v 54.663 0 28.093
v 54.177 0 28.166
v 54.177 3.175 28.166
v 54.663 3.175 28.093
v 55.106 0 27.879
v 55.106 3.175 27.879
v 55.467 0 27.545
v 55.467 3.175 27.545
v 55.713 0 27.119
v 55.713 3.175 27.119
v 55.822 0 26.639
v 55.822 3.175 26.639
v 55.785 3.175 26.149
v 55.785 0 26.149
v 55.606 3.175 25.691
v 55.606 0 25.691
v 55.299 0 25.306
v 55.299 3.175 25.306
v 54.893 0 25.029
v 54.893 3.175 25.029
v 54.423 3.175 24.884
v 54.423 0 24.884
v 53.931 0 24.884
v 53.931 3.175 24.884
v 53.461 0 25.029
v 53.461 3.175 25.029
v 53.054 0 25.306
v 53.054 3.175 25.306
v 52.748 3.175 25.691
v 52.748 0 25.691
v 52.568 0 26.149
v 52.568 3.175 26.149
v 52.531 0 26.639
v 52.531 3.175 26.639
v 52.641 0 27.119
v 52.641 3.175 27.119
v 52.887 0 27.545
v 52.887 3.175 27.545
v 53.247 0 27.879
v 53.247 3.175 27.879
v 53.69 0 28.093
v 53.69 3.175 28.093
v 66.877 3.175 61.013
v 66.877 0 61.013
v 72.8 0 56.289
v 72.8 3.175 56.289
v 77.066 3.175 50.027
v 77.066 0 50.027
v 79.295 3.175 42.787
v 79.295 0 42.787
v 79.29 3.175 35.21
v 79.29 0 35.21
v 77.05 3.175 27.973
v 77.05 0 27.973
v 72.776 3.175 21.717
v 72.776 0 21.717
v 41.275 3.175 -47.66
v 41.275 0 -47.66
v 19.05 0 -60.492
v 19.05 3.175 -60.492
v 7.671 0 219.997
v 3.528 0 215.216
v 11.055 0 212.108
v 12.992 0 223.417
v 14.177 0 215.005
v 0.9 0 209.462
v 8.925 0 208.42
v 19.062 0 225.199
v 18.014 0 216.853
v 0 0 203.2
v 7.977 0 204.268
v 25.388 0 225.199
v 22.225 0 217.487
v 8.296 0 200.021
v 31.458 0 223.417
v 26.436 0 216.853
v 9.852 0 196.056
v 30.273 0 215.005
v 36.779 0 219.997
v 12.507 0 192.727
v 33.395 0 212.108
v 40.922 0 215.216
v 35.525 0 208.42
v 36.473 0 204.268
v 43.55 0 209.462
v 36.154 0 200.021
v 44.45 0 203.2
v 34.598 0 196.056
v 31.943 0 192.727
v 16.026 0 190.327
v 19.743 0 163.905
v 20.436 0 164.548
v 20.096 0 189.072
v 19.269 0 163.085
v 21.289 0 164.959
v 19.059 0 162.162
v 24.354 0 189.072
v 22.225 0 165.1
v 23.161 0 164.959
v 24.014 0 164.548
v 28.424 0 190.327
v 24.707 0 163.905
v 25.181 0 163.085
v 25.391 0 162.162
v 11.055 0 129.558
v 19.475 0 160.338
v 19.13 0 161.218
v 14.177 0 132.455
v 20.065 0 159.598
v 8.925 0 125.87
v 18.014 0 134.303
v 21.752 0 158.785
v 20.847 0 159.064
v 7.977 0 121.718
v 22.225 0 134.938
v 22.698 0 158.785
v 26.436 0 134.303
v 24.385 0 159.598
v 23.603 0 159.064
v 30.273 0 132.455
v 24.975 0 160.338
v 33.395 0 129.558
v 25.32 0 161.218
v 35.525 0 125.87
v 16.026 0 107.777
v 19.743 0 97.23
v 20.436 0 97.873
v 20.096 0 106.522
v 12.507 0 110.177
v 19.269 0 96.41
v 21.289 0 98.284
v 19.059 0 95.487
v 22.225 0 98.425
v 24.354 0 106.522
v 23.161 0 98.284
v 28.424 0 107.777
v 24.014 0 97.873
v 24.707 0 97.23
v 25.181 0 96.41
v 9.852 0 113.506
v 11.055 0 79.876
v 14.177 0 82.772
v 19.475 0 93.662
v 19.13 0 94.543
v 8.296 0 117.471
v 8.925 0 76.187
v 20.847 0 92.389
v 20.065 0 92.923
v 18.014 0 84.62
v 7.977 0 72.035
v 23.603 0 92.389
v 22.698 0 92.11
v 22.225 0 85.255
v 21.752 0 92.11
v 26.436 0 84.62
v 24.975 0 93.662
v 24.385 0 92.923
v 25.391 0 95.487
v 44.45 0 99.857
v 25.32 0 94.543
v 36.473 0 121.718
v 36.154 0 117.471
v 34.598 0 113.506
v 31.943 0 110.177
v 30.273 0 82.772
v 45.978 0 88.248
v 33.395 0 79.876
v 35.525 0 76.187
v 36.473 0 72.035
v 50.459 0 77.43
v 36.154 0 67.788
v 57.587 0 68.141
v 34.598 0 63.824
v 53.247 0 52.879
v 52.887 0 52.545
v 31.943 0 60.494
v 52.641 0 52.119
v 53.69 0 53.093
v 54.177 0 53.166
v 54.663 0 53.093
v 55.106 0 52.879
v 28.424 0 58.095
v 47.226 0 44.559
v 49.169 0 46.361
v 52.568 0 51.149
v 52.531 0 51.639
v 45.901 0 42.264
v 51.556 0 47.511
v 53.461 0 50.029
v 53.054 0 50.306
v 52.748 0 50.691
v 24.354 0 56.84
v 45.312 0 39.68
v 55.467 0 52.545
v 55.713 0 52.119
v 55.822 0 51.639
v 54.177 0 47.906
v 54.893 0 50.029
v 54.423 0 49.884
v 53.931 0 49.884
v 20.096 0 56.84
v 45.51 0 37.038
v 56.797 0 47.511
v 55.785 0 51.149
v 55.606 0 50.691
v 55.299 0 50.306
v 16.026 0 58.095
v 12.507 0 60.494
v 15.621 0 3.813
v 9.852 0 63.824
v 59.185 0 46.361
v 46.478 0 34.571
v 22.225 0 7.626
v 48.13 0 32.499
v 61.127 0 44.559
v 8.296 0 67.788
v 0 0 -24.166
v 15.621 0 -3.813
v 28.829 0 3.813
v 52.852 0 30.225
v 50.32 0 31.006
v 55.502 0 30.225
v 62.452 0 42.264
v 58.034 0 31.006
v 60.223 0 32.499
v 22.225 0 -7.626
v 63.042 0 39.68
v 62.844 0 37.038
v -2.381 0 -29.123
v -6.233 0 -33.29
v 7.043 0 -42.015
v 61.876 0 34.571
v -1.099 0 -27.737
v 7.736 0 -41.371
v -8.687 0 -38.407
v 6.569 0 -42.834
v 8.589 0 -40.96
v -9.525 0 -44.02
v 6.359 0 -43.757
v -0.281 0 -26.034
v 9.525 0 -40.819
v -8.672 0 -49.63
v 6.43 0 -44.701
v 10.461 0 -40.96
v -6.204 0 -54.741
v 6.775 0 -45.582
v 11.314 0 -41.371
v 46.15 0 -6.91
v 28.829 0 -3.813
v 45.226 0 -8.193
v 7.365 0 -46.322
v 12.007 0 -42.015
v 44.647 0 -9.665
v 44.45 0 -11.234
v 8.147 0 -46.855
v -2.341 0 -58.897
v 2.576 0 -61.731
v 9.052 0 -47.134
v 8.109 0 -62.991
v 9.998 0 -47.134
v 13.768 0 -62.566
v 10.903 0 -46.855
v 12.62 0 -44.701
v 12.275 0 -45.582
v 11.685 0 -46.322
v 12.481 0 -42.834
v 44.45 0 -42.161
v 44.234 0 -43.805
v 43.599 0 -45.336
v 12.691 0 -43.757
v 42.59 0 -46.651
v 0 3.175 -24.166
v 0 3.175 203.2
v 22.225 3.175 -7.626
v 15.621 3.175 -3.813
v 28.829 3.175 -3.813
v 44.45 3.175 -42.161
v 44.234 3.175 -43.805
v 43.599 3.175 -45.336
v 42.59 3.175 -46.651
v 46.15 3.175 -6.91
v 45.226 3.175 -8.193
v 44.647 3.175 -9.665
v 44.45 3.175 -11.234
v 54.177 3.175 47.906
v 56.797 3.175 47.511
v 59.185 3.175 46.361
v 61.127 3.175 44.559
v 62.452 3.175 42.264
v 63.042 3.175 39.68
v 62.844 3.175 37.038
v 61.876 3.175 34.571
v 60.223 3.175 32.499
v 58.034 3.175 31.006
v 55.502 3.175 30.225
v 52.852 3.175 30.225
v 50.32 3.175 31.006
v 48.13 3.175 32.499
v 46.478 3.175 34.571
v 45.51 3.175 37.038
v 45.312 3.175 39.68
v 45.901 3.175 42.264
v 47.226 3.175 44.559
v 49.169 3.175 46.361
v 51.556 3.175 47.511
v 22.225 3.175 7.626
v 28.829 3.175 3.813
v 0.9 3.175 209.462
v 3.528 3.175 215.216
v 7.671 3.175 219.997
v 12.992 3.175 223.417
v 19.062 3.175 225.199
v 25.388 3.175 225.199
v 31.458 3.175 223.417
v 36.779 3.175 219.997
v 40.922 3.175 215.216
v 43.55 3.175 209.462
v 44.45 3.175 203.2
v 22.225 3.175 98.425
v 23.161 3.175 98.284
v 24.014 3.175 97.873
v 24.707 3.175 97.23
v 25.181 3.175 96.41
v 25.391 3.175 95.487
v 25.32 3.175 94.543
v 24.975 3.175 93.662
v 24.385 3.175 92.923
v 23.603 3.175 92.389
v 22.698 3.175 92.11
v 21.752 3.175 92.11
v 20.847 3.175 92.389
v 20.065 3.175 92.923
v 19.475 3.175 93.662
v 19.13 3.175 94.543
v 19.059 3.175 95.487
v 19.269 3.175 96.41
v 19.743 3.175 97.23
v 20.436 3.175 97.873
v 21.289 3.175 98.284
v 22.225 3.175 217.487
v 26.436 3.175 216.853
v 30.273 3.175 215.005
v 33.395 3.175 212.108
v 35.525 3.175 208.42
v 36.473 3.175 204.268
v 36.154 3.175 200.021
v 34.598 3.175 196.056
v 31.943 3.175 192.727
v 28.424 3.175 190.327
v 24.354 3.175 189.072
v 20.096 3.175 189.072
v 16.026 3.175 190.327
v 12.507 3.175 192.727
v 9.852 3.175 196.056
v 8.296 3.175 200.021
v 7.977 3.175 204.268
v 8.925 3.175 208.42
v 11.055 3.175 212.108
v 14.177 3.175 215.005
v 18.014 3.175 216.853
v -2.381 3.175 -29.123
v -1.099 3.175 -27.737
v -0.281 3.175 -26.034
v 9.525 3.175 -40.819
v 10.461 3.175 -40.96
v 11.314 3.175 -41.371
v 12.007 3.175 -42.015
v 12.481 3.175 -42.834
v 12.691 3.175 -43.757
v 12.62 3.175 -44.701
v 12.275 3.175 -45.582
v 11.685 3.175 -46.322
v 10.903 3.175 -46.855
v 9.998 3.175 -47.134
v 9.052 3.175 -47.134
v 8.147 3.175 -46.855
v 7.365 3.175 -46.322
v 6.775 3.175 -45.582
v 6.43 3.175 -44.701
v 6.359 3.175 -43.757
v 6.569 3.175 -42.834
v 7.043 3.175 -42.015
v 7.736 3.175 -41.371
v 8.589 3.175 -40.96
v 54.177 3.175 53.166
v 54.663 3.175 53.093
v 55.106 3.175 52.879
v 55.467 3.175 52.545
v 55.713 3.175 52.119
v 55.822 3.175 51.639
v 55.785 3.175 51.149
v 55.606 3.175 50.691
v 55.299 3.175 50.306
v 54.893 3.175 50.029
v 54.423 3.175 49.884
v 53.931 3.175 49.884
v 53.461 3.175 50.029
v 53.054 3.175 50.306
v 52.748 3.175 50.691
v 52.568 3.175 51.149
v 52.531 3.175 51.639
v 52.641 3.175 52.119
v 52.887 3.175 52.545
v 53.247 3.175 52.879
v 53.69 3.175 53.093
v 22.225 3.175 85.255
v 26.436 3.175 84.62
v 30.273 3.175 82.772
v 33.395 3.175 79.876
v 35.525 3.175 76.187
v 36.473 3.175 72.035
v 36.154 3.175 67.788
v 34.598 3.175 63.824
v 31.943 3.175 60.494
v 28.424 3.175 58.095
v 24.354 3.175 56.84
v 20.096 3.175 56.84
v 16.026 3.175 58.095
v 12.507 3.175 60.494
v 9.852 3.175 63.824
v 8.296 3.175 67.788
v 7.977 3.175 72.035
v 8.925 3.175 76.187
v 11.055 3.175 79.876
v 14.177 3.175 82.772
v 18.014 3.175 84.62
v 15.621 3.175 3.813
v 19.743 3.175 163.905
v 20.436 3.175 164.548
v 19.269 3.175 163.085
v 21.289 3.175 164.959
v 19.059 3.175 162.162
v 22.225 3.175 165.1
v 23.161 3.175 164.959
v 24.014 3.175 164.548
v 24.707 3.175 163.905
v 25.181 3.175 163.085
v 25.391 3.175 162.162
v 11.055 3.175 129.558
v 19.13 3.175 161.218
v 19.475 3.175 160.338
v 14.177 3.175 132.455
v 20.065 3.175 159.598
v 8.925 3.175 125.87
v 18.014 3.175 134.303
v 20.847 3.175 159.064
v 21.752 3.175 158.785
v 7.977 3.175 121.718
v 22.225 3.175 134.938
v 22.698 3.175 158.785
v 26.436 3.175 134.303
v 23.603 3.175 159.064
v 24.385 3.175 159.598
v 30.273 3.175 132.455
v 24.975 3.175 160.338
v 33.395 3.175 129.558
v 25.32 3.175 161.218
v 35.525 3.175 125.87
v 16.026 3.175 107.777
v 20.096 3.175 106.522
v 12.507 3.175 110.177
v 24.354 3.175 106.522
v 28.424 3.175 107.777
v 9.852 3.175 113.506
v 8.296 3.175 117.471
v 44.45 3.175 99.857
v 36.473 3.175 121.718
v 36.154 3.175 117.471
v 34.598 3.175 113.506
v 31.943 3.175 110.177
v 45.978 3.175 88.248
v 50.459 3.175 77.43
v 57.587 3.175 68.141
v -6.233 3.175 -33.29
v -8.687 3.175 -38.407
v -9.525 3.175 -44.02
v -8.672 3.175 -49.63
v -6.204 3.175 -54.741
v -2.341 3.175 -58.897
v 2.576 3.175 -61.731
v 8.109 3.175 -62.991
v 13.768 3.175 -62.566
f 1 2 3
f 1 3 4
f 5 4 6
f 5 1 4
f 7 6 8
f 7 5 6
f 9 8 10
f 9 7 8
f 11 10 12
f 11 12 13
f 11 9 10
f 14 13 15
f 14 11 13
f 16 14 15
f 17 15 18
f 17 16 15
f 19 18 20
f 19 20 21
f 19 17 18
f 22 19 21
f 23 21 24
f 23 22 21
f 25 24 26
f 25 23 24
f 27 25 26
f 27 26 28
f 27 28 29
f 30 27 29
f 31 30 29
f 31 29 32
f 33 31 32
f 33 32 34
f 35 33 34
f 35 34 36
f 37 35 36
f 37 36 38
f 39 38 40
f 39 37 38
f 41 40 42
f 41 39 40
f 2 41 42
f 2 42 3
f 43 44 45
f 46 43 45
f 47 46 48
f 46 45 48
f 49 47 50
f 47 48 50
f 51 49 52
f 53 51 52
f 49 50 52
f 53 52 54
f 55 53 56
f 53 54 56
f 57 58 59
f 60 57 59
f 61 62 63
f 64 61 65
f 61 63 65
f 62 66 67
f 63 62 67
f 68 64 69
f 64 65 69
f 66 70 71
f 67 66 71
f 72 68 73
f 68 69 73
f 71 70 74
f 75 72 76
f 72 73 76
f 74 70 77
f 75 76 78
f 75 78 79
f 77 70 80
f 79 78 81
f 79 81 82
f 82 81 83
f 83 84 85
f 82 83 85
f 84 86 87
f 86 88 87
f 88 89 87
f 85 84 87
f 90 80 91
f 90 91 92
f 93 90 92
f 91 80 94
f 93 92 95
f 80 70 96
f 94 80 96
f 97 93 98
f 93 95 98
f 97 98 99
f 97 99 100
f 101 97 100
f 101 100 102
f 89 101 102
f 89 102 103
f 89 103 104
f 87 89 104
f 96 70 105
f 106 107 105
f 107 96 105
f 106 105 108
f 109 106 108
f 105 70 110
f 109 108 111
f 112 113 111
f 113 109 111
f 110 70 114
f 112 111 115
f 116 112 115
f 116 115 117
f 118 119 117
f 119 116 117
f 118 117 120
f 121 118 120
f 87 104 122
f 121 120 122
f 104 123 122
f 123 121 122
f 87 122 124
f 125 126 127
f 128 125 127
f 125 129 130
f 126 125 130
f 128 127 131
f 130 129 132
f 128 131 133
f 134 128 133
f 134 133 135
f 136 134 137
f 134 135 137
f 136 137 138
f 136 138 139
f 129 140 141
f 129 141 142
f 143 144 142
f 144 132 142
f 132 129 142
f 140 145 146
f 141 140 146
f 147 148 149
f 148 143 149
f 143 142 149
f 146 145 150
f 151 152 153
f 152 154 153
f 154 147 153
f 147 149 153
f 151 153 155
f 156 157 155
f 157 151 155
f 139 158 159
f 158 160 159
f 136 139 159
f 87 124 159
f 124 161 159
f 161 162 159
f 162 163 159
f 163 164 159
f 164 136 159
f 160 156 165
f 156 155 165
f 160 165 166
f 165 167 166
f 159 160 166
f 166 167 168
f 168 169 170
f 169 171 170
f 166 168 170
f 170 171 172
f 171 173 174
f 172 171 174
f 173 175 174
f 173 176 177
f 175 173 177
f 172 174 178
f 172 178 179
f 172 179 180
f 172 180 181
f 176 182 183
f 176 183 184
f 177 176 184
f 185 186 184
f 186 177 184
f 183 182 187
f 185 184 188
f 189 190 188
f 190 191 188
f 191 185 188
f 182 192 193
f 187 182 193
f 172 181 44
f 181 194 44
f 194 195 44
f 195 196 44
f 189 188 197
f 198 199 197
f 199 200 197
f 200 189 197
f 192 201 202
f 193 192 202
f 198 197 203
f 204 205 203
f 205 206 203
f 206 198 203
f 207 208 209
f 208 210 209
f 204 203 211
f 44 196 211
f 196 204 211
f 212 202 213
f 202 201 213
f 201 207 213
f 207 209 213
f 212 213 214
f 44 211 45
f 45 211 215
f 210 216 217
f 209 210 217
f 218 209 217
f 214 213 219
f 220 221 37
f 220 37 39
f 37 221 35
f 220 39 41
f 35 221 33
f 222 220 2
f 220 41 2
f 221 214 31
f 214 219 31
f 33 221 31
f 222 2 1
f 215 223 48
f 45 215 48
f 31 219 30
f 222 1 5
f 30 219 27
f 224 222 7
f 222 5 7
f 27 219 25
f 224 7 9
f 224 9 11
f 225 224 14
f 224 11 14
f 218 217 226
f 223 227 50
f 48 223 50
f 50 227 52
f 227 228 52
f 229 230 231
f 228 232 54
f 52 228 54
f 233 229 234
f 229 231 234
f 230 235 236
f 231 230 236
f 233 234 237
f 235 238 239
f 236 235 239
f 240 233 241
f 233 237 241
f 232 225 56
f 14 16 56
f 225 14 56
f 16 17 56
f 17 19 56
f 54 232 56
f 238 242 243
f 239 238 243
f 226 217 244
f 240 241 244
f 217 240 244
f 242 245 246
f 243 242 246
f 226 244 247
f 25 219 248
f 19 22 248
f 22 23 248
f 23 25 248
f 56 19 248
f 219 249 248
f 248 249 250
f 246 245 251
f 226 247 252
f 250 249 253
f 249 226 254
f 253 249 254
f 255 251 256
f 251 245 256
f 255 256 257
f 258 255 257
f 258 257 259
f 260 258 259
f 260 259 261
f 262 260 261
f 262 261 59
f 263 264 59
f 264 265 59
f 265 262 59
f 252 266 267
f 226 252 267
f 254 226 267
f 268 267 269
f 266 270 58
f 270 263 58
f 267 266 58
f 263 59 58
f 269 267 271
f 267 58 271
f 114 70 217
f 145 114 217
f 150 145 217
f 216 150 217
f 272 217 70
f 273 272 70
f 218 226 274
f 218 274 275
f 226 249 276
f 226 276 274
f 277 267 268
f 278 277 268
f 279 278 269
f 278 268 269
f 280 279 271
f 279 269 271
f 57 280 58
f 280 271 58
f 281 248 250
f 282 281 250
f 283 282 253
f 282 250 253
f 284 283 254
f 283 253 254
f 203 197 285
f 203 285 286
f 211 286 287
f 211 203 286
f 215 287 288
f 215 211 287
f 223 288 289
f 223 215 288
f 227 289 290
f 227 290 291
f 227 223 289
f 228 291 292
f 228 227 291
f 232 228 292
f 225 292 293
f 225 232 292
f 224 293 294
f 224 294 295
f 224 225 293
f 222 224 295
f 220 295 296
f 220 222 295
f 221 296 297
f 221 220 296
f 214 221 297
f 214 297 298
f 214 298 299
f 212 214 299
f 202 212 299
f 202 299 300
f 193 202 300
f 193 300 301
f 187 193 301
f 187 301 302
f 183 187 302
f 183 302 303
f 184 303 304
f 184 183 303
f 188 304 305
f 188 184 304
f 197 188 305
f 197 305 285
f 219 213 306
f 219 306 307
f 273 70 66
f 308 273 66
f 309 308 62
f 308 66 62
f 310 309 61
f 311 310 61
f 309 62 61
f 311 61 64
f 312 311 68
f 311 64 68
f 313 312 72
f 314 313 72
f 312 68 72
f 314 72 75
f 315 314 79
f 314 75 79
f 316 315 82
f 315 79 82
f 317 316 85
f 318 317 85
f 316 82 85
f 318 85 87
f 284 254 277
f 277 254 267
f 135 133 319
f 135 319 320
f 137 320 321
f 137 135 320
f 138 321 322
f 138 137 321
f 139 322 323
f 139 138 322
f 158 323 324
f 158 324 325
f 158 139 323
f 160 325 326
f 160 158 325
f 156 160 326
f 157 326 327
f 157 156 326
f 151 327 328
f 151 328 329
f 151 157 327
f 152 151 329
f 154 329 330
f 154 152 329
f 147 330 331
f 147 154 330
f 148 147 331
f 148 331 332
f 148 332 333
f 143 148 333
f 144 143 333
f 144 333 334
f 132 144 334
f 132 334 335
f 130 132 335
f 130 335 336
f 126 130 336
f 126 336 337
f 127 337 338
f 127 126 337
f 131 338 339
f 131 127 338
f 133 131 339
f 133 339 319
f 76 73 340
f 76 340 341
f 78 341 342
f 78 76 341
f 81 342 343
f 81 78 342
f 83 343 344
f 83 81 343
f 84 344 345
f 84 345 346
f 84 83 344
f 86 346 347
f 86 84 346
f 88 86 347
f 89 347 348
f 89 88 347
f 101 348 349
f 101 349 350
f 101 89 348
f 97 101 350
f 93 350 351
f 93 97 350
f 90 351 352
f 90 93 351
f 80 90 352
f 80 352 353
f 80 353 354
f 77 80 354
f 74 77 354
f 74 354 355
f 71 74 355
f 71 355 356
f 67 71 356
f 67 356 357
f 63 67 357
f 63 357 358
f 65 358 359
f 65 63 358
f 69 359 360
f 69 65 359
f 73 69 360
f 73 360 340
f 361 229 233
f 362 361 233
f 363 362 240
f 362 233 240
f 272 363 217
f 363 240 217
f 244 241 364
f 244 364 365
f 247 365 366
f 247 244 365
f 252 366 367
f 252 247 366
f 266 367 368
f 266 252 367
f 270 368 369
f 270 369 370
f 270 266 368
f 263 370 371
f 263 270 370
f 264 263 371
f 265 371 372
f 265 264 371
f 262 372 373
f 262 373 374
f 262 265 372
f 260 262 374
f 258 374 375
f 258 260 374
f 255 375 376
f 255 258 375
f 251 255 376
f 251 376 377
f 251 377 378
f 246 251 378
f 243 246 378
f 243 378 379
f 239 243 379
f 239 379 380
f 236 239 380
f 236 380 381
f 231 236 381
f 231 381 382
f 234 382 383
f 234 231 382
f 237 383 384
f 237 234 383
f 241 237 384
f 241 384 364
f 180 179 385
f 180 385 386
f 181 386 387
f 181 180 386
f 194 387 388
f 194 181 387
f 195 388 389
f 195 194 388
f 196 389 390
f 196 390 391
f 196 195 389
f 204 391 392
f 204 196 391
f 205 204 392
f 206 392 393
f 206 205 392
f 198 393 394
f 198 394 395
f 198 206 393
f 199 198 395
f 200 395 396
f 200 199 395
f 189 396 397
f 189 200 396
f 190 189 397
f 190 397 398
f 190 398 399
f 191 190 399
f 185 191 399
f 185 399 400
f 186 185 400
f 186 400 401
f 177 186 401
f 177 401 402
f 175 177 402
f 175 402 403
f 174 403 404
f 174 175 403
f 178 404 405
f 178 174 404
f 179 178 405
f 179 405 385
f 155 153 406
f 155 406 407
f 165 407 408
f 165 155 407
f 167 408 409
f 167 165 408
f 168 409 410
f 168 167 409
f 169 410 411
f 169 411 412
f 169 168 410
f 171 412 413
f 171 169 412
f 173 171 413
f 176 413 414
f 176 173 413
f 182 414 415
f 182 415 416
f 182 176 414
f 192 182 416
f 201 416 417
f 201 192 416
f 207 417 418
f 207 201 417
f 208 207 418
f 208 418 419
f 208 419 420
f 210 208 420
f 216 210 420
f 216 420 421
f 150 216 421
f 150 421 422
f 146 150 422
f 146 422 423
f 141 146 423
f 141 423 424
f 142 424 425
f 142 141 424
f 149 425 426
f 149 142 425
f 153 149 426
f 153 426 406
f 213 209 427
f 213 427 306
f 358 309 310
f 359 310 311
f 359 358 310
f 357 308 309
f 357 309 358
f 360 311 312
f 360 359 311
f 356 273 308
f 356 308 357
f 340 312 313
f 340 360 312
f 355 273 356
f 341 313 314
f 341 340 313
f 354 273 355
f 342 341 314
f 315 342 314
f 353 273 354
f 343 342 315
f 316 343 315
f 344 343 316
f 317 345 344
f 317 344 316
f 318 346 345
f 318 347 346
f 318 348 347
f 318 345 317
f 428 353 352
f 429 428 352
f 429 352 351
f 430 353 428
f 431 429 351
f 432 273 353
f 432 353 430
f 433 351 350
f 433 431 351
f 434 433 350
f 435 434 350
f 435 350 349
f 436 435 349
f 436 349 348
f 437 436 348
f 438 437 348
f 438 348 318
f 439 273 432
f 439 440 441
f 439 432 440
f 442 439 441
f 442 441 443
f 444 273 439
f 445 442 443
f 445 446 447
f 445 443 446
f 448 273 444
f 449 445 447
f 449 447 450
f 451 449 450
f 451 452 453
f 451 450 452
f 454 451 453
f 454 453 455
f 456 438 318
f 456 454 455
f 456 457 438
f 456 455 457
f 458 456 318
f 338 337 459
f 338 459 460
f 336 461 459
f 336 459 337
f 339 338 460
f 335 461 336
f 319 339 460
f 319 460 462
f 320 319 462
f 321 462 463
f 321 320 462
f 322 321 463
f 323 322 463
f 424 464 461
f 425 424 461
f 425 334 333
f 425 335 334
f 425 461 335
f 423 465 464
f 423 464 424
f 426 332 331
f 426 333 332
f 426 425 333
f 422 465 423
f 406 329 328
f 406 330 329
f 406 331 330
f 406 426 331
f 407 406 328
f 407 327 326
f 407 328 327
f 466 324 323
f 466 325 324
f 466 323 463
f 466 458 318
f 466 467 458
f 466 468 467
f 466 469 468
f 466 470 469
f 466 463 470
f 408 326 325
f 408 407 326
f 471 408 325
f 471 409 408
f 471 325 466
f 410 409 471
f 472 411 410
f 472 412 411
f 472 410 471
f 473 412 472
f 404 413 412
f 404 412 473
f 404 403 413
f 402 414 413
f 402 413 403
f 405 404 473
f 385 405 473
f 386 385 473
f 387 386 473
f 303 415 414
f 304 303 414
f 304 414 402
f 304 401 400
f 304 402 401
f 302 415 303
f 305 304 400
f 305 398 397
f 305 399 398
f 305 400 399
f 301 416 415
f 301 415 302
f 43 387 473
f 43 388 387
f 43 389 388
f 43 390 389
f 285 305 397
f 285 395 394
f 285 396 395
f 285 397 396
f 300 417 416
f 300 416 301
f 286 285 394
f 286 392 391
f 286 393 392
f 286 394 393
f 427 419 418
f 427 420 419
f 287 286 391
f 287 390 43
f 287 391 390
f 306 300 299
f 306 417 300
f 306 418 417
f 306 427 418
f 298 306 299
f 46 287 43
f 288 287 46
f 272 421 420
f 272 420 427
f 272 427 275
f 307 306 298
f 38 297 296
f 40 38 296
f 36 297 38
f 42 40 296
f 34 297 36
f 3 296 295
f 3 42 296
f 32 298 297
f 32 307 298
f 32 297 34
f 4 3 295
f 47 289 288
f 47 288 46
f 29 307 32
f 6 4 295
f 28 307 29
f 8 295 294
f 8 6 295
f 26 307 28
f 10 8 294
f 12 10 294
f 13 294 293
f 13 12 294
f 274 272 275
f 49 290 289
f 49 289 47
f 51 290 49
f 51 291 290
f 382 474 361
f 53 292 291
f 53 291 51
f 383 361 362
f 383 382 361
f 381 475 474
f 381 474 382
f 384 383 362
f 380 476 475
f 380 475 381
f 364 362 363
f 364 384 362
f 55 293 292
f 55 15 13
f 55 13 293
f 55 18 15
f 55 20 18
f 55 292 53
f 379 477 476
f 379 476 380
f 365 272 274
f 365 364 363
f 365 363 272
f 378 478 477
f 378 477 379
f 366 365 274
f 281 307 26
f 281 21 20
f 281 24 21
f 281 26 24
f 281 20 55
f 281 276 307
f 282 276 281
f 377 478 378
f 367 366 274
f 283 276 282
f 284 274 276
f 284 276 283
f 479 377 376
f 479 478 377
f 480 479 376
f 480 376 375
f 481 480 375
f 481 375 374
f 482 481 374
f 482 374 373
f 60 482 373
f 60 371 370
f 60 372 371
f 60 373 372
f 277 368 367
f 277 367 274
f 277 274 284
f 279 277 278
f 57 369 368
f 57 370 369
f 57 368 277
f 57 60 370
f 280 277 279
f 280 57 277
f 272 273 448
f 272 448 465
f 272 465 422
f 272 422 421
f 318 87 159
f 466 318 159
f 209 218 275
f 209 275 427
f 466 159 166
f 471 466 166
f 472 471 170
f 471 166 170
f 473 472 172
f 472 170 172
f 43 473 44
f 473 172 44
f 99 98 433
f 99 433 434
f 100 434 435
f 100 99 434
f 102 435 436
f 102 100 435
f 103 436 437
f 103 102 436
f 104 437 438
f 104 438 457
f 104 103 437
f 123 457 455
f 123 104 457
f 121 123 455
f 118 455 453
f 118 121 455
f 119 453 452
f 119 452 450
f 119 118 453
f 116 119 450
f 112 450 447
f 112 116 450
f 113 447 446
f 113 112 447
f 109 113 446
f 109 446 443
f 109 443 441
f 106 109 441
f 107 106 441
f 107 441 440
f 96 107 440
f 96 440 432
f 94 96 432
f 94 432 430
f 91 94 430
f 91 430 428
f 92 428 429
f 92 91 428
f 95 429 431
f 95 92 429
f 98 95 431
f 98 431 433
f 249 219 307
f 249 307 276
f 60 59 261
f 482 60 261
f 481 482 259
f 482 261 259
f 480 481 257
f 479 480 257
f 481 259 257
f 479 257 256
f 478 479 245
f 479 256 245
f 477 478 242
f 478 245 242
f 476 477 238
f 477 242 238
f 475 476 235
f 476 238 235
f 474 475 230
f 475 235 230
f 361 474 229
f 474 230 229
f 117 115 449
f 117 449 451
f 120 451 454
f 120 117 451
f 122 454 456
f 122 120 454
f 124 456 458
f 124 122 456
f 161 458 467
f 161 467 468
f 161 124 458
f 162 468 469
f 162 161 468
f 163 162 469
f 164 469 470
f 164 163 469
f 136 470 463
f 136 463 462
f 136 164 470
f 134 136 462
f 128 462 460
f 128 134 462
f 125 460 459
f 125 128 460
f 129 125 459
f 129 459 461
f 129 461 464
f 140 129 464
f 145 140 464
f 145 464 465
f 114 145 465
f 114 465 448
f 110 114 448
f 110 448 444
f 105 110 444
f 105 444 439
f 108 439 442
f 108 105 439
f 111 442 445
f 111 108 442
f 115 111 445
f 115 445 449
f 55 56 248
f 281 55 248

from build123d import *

# Parameters (mm, degrees)
SKETCH1_R           = 14.2875
SKETCH1_R_2         = 3.175
SKETCH1_R_3         = 8.89
SKETCH1_R_4         = 1.650000002
BOSS_EXTRUDE1_DEPTH = 3.175


with BuildPart() as part:
    # Sketch1 → Boss-Extrude1 (new body)
    with BuildSketch(Plane(origin=(0, 0, 0), x_dir=(1, 0, 0), z_dir=(0, 1, 0))):
        with BuildLine():
            Line((0, 24.166221867), (0, -203.2))
            ThreePointArc((0, -203.2), (22.225, -225.425), (44.45, -203.2))
            Line((44.45, -203.2), (44.45, -99.857166641))
            ThreePointArc((44.45, -99.857166641), (50.459229894, -77.430415362), (66.876751279, -61.012893977))
            ThreePointArc((66.876751279, -61.012893977), (79.295297798, -42.786607364), (72.775737997, -21.717360549))
            Line((72.775737997, -21.717360549), (46.15025332, 6.909825302))
            ThreePointArc((46.15025332, 6.909825302), (44.890330322, 8.911022224), (44.45, 11.234447345))
            Line((44.45, 11.234447345), (44.45, 42.161003408))
            ThreePointArc((44.45, 42.161003408), (43.599261314, 45.336003408), (41.275, 47.660264722))
            Line((41.275, 47.660264722), (19.05, 60.491874454))
            ThreePointArc((19.05, 60.491874454), (-6.204468975, 54.74054601), (-2.38125, 29.123189029))
            ThreePointArc((-2.38125, 29.123189029), (-0.62618735, 26.915852524), (0, 24.166221867))
        make_face()
        with Locations(Location((22.225, -203.2, 0), (0, 0, 270))):
            Circle(SKETCH1_R, mode=Mode.SUBTRACT)
        with Locations(Location((22.225, -120.65, 0), (0, 0, 270))):
            Circle(SKETCH1_R, mode=Mode.SUBTRACT)
        with Locations(Location((22.225, -70.9676, 0), (0, 0, 270))):
            Circle(SKETCH1_R, mode=Mode.SUBTRACT)
        with Locations(Location((22.225, -95.25, 0), (0, 0, 270))):
            Circle(SKETCH1_R_2, mode=Mode.SUBTRACT)
        with Locations(Location((22.225, -161.925, 0), (0, 0, 270))):
            Circle(SKETCH1_R_2, mode=Mode.SUBTRACT)
        with Locations(Location((9.525, 43.994090512, 0), (0, 0, 270))):
            Circle(SKETCH1_R_2, mode=Mode.SUBTRACT)
        with Locations(Location((54.176751279, -39.015848721, 0), (0, 0, 270))):
            Circle(SKETCH1_R_3, mode=Mode.SUBTRACT)
        with Locations(Location((54.176751279, -51.515848613, 0), (0, 0, 270))):
            Circle(SKETCH1_R_4, mode=Mode.SUBTRACT)
        with Locations(Location((54.176751279, -26.515848829, 0), (0, 0, 270))):
            Circle(SKETCH1_R_4, mode=Mode.SUBTRACT)
        Polygon((22.225, -7.625642355), (28.829, -3.812821178), (28.829, 3.812821178), (22.225, 7.625642355), (15.621, 3.812821178), (15.621, -3.812821178), align=None, mode=Mode.SUBTRACT)
    extrude(amount=BOSS_EXTRUDE1_DEPTH)


solid = part.part
